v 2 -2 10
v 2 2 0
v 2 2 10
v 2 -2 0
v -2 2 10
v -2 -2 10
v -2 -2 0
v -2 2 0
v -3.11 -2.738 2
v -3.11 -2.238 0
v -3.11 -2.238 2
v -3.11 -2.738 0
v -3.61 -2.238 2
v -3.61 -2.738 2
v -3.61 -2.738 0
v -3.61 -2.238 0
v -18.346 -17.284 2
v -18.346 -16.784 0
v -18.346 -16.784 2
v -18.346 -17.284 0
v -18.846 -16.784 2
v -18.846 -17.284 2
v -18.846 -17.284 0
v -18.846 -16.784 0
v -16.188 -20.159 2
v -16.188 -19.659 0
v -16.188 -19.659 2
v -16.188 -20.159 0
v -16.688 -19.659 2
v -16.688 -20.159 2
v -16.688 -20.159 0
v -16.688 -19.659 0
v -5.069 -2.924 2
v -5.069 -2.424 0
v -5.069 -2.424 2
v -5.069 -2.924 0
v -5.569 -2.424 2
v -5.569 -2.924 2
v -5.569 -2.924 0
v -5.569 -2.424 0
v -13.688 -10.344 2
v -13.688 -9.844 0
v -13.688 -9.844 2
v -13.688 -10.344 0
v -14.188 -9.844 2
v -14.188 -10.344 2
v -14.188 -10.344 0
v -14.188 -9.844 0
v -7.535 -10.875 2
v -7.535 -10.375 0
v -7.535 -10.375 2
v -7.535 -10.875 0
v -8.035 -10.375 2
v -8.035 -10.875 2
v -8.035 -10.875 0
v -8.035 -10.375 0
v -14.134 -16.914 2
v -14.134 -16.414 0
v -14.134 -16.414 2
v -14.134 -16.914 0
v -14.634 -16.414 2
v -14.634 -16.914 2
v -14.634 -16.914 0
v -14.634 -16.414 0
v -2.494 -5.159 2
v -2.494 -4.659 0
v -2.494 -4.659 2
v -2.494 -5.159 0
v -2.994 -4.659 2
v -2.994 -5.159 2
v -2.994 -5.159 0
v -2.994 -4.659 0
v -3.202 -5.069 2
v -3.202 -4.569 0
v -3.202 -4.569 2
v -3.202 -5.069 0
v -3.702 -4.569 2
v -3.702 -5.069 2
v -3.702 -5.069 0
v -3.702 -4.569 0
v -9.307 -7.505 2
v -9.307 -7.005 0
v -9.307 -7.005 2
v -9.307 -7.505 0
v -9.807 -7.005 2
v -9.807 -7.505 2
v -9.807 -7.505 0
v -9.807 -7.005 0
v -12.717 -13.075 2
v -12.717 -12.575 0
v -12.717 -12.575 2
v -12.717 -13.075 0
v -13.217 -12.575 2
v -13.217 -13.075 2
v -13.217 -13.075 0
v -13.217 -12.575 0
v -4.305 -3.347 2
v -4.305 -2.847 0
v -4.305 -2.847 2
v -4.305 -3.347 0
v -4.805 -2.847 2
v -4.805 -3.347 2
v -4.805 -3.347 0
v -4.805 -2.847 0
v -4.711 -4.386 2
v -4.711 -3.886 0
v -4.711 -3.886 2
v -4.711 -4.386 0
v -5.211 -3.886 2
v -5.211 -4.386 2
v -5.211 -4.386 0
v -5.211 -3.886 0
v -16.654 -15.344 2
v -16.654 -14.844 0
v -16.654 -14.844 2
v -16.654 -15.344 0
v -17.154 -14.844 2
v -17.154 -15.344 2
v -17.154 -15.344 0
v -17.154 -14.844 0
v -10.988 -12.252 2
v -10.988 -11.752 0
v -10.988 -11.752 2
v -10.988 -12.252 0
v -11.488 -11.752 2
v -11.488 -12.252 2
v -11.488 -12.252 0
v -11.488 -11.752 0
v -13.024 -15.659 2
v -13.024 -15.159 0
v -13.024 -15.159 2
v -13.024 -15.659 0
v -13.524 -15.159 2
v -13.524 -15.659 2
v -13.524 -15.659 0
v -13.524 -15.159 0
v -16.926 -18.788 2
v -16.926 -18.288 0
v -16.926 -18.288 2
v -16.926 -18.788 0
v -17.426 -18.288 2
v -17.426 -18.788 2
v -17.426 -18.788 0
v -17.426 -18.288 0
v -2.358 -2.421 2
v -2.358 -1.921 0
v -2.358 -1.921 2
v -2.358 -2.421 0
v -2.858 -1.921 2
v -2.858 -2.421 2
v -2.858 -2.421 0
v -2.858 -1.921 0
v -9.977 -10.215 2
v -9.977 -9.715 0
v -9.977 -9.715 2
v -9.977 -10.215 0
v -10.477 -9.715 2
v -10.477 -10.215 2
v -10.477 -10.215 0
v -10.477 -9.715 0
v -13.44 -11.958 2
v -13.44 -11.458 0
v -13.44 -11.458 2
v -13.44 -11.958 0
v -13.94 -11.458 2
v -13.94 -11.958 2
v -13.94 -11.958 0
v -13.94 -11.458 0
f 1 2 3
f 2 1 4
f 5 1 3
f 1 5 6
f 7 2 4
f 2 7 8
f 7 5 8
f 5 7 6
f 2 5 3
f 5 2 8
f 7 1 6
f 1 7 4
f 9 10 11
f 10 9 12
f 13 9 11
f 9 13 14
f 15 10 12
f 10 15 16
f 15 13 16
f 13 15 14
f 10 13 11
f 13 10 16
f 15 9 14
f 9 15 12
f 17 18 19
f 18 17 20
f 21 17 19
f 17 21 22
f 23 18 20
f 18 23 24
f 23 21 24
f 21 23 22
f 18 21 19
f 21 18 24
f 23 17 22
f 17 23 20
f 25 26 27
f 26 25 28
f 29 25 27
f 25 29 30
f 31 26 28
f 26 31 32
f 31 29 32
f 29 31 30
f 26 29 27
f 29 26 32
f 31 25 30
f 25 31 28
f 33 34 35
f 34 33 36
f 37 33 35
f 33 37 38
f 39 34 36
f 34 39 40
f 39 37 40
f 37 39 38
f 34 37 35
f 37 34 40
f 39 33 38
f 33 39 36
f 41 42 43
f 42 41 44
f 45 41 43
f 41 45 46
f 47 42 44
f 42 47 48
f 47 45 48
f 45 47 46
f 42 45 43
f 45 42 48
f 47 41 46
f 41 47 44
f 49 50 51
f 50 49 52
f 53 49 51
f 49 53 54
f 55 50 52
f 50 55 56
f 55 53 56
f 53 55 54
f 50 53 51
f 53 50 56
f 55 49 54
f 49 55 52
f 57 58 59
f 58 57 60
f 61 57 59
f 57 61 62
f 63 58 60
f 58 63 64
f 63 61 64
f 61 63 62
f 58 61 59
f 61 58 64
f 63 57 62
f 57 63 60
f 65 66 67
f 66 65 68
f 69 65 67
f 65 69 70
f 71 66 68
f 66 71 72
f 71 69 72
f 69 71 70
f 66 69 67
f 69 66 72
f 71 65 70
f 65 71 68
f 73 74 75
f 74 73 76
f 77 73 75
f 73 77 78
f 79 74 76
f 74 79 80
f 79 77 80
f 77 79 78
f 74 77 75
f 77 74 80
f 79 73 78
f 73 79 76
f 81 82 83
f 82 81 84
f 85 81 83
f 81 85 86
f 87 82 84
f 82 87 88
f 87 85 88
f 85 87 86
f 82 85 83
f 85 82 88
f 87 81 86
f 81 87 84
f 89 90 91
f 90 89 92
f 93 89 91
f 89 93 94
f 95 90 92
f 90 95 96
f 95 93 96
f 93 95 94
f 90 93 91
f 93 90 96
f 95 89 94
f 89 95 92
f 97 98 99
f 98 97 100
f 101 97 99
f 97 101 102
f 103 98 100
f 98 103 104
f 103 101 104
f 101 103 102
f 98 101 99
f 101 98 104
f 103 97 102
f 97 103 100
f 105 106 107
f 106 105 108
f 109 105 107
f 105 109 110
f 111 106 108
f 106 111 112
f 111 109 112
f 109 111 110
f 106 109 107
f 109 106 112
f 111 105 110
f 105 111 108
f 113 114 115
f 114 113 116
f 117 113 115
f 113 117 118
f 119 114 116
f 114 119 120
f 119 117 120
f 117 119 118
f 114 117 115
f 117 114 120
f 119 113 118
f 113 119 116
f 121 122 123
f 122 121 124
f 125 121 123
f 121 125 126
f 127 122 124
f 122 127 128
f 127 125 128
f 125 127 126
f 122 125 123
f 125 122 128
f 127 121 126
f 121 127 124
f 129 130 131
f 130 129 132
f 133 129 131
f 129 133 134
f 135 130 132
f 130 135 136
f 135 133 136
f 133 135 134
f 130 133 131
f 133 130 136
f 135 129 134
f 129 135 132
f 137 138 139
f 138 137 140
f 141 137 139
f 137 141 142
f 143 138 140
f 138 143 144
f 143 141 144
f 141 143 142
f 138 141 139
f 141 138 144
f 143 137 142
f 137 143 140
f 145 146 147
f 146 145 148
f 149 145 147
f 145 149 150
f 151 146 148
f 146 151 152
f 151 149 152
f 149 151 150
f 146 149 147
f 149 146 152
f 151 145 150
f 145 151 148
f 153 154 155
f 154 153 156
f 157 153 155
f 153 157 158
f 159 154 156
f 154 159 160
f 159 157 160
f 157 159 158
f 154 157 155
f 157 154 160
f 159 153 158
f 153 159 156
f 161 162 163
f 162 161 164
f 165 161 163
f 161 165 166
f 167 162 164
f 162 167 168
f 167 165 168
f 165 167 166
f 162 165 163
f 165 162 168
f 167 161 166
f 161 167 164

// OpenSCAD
translate([0, 0, 5]) color([0,1,0,0.9]) cube([4, 4, 10], center=true);
translate([-3.3601, -2.4877, 1]) color([1,0,0]) cube([0.5, 0.5, 2], center=true);
translate([-18.5961, -17.0339, 1]) color([1,0,0]) cube([0.5, 0.5, 2], center=true);
translate([-16.4383, -19.9085, 1]) color([1,0,0]) cube([0.5, 0.5, 2], center=true);
translate([-5.3192, -2.6745, 1]) color([1,0,0]) cube([0.5, 0.5, 2], center=true);
translate([-13.9379, -10.0941, 1]) color([1,0,0]) cube([0.5, 0.5, 2], center=true);
translate([-7.7849, -10.6247, 1]) color([1,0,0]) cube([0.5, 0.5, 2], center=true);
translate([-14.3845, -16.6643, 1]) color([1,0,0]) cube([0.5, 0.5, 2], center=true);
translate([-2.7437, -4.9088, 1]) color([1,0,0]) cube([0.5, 0.5, 2], center=true);
translate([-3.4518, -4.8188, 1]) color([1,0,0]) cube([0.5, 0.5, 2], center=true);
translate([-9.5566, -7.2554, 1]) color([1,0,0]) cube([0.5, 0.5, 2], center=true);
translate([-12.967, -12.8253, 1]) color([1,0,0]) cube([0.5, 0.5, 2], center=true);
translate([-4.5552, -3.0973, 1]) color([1,0,0]) cube([0.5, 0.5, 2], center=true);
translate([-4.9608, -4.1356, 1]) color([1,0,0]) cube([0.5, 0.5, 2], center=true);
translate([-16.9036, -15.0941, 1]) color([1,0,0]) cube([0.5, 0.5, 2], center=true);
translate([-11.2376, -12.0022, 1]) color([1,0,0]) cube([0.5, 0.5, 2], center=true);
translate([-13.2743, -15.4089, 1]) color([1,0,0]) cube([0.5, 0.5, 2], center=true);
translate([-17.1763, -18.5377, 1]) color([1,0,0]) cube([0.5, 0.5, 2], center=true);
translate([-2.6082, -2.171, 1]) color([1,0,0]) cube([0.5, 0.5, 2], center=true);
translate([-10.2267, -9.9649, 1]) color([1,0,0]) cube([0.5, 0.5, 2], center=true);
translate([-13.6905, -11.7079, 1]) color([1,0,0]) cube([0.5, 0.5, 2], center=true);
